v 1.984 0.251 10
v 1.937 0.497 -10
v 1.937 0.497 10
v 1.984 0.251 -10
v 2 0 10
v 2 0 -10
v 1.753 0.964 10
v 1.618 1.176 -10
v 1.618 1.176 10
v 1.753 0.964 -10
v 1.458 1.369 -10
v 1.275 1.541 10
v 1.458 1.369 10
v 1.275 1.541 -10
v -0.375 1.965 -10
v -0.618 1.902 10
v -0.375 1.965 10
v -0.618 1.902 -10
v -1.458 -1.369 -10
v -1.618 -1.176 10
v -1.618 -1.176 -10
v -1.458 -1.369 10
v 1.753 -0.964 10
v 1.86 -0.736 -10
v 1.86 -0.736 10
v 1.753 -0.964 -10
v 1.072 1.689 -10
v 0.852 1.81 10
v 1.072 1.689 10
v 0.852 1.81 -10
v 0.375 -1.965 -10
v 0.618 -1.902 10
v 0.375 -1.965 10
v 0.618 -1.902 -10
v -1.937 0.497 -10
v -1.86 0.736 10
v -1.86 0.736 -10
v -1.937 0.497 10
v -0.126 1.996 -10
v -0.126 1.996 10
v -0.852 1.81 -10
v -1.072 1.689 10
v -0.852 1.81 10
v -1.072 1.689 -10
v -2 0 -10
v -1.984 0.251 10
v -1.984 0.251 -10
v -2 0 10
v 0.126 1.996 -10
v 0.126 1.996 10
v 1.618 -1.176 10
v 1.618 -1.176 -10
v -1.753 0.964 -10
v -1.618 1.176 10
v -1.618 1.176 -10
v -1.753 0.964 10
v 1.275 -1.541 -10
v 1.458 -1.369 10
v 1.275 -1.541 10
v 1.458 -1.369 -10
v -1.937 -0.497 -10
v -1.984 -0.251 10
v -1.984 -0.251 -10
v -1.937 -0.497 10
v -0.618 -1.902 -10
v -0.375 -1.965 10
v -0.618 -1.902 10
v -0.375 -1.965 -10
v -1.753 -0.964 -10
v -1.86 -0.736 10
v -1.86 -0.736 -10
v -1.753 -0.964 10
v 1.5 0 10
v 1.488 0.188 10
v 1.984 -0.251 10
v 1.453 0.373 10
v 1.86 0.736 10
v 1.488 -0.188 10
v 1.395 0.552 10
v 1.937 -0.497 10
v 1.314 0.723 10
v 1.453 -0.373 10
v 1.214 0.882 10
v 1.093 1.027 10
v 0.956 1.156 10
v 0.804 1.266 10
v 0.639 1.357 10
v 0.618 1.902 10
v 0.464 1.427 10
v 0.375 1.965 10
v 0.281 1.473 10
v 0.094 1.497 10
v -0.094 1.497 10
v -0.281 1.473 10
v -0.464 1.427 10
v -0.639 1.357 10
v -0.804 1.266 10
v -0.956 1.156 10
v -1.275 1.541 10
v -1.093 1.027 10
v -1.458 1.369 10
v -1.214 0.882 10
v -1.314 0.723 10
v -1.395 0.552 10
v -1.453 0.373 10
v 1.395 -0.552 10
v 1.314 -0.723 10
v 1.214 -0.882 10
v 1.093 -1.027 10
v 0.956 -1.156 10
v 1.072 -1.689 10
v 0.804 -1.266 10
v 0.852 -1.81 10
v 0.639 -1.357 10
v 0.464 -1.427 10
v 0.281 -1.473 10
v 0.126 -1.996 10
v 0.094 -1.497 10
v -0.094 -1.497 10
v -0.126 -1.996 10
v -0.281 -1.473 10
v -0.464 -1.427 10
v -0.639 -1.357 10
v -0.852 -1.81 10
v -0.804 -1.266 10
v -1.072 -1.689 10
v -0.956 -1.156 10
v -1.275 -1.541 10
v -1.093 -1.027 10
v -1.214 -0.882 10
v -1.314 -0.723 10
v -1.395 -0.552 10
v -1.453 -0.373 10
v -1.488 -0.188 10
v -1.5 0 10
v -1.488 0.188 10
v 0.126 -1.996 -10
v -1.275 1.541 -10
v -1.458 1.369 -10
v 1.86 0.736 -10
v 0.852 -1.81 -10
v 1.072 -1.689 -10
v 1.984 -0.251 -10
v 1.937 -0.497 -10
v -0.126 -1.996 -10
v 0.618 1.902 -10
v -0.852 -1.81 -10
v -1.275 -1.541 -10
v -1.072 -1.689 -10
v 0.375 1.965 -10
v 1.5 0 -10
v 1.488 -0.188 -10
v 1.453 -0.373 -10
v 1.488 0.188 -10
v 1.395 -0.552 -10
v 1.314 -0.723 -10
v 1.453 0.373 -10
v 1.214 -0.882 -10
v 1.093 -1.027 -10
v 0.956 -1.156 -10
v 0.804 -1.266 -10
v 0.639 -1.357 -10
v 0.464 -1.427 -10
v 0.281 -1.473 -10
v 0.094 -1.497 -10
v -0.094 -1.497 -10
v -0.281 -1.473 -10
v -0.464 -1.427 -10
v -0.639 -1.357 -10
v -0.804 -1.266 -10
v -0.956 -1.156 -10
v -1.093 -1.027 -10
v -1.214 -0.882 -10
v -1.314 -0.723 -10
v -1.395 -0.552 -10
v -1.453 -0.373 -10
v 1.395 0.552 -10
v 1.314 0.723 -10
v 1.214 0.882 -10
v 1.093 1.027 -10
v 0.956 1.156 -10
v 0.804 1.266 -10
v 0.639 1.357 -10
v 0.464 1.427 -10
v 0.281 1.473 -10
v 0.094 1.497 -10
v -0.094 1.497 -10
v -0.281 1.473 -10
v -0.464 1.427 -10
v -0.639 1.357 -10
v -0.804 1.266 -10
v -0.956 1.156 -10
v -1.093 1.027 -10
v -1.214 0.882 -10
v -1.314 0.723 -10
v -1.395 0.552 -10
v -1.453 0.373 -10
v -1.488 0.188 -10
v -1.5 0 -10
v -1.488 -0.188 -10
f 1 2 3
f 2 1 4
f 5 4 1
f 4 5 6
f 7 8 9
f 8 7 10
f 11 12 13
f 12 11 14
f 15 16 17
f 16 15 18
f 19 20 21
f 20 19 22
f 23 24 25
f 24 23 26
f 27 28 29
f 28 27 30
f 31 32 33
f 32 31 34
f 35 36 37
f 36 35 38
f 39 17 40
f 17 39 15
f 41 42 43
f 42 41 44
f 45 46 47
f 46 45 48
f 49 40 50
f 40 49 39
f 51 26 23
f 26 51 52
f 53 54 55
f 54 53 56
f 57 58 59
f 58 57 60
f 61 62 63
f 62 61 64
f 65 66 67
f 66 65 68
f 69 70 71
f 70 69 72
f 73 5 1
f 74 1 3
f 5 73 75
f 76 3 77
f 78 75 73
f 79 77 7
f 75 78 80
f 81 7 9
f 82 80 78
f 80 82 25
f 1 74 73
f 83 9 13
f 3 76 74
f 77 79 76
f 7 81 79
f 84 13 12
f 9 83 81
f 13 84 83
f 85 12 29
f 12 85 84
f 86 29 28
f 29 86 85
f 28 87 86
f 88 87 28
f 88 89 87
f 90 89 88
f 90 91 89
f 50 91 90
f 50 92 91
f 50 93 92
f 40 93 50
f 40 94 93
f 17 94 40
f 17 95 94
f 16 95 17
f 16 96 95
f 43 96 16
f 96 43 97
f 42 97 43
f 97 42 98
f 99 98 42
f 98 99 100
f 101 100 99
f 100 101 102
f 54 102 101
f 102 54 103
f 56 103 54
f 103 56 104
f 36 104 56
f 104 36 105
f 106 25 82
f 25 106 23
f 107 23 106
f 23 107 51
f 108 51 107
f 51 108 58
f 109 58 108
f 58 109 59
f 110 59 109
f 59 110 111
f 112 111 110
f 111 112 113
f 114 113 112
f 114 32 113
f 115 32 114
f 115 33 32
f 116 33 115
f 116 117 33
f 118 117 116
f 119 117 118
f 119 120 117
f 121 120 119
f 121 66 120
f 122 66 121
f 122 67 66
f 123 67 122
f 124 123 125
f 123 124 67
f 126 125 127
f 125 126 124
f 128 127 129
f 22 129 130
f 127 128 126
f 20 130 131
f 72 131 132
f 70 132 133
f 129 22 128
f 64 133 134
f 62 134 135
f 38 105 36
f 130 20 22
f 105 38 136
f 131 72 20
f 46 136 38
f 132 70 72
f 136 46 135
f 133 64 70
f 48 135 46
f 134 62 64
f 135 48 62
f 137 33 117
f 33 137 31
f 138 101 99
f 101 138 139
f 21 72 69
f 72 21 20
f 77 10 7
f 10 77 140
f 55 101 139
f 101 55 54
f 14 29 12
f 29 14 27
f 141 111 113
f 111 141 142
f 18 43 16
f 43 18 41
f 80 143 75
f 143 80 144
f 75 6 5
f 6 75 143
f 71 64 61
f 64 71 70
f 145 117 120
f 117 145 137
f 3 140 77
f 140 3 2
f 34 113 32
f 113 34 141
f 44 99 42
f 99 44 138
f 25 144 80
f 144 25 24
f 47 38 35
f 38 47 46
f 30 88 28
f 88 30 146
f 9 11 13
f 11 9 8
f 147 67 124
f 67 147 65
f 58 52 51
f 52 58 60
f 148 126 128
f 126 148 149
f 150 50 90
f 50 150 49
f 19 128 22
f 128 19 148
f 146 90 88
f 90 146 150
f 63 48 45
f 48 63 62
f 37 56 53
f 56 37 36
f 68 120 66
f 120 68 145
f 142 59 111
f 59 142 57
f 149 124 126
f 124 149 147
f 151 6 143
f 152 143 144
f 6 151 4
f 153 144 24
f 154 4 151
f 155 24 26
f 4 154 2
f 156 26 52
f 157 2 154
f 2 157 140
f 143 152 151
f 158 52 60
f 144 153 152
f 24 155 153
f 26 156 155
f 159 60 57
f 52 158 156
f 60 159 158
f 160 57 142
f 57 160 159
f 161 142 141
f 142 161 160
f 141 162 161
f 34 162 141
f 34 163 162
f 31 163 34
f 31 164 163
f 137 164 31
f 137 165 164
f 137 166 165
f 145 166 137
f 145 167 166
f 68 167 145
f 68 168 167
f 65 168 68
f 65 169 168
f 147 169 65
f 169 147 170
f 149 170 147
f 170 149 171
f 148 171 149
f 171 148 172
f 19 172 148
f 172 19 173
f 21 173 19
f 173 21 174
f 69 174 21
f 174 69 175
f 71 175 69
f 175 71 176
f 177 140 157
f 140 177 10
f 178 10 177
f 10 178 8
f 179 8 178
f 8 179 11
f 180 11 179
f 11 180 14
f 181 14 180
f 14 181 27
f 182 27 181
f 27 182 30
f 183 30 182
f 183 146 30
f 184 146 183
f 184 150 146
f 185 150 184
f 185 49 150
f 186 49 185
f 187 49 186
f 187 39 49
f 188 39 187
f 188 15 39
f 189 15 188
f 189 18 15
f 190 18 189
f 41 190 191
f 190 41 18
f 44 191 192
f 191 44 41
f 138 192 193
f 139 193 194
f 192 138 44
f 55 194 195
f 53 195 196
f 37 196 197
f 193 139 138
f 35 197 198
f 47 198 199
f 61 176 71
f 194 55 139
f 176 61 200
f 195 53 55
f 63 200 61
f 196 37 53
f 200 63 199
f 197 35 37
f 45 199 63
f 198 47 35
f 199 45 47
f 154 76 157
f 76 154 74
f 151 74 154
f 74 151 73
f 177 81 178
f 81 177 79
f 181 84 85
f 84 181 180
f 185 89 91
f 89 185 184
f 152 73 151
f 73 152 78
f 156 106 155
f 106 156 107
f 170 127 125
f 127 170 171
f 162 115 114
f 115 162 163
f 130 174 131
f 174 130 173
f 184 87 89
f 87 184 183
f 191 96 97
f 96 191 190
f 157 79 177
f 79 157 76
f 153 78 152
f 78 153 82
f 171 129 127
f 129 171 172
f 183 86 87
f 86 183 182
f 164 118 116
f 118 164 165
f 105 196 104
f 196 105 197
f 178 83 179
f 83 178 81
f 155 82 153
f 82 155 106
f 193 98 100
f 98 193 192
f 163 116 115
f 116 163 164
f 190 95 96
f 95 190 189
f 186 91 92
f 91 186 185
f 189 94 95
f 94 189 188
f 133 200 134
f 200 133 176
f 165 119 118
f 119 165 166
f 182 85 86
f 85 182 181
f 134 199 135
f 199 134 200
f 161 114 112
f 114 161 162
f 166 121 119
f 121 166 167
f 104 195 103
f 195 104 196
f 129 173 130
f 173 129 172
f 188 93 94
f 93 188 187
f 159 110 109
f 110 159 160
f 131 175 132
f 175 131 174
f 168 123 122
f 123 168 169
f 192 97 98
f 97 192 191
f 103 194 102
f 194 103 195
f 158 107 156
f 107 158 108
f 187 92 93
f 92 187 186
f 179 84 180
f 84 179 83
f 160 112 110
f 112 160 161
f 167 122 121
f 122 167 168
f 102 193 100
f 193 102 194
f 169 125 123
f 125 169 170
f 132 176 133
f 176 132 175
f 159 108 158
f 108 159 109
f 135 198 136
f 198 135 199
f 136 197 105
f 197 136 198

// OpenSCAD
$fn = 50;


difference() {
	union() {
		translate(v = [0, 0, -10.0000000000]) {
			cylinder(h = 20, r = 2.0000000000);
		}
	}
	union() {
		translate(v = [0, 0, -100.0000000000]) {
			cylinder(h = 200, r = 1.5000000000);
		}
	}
}
